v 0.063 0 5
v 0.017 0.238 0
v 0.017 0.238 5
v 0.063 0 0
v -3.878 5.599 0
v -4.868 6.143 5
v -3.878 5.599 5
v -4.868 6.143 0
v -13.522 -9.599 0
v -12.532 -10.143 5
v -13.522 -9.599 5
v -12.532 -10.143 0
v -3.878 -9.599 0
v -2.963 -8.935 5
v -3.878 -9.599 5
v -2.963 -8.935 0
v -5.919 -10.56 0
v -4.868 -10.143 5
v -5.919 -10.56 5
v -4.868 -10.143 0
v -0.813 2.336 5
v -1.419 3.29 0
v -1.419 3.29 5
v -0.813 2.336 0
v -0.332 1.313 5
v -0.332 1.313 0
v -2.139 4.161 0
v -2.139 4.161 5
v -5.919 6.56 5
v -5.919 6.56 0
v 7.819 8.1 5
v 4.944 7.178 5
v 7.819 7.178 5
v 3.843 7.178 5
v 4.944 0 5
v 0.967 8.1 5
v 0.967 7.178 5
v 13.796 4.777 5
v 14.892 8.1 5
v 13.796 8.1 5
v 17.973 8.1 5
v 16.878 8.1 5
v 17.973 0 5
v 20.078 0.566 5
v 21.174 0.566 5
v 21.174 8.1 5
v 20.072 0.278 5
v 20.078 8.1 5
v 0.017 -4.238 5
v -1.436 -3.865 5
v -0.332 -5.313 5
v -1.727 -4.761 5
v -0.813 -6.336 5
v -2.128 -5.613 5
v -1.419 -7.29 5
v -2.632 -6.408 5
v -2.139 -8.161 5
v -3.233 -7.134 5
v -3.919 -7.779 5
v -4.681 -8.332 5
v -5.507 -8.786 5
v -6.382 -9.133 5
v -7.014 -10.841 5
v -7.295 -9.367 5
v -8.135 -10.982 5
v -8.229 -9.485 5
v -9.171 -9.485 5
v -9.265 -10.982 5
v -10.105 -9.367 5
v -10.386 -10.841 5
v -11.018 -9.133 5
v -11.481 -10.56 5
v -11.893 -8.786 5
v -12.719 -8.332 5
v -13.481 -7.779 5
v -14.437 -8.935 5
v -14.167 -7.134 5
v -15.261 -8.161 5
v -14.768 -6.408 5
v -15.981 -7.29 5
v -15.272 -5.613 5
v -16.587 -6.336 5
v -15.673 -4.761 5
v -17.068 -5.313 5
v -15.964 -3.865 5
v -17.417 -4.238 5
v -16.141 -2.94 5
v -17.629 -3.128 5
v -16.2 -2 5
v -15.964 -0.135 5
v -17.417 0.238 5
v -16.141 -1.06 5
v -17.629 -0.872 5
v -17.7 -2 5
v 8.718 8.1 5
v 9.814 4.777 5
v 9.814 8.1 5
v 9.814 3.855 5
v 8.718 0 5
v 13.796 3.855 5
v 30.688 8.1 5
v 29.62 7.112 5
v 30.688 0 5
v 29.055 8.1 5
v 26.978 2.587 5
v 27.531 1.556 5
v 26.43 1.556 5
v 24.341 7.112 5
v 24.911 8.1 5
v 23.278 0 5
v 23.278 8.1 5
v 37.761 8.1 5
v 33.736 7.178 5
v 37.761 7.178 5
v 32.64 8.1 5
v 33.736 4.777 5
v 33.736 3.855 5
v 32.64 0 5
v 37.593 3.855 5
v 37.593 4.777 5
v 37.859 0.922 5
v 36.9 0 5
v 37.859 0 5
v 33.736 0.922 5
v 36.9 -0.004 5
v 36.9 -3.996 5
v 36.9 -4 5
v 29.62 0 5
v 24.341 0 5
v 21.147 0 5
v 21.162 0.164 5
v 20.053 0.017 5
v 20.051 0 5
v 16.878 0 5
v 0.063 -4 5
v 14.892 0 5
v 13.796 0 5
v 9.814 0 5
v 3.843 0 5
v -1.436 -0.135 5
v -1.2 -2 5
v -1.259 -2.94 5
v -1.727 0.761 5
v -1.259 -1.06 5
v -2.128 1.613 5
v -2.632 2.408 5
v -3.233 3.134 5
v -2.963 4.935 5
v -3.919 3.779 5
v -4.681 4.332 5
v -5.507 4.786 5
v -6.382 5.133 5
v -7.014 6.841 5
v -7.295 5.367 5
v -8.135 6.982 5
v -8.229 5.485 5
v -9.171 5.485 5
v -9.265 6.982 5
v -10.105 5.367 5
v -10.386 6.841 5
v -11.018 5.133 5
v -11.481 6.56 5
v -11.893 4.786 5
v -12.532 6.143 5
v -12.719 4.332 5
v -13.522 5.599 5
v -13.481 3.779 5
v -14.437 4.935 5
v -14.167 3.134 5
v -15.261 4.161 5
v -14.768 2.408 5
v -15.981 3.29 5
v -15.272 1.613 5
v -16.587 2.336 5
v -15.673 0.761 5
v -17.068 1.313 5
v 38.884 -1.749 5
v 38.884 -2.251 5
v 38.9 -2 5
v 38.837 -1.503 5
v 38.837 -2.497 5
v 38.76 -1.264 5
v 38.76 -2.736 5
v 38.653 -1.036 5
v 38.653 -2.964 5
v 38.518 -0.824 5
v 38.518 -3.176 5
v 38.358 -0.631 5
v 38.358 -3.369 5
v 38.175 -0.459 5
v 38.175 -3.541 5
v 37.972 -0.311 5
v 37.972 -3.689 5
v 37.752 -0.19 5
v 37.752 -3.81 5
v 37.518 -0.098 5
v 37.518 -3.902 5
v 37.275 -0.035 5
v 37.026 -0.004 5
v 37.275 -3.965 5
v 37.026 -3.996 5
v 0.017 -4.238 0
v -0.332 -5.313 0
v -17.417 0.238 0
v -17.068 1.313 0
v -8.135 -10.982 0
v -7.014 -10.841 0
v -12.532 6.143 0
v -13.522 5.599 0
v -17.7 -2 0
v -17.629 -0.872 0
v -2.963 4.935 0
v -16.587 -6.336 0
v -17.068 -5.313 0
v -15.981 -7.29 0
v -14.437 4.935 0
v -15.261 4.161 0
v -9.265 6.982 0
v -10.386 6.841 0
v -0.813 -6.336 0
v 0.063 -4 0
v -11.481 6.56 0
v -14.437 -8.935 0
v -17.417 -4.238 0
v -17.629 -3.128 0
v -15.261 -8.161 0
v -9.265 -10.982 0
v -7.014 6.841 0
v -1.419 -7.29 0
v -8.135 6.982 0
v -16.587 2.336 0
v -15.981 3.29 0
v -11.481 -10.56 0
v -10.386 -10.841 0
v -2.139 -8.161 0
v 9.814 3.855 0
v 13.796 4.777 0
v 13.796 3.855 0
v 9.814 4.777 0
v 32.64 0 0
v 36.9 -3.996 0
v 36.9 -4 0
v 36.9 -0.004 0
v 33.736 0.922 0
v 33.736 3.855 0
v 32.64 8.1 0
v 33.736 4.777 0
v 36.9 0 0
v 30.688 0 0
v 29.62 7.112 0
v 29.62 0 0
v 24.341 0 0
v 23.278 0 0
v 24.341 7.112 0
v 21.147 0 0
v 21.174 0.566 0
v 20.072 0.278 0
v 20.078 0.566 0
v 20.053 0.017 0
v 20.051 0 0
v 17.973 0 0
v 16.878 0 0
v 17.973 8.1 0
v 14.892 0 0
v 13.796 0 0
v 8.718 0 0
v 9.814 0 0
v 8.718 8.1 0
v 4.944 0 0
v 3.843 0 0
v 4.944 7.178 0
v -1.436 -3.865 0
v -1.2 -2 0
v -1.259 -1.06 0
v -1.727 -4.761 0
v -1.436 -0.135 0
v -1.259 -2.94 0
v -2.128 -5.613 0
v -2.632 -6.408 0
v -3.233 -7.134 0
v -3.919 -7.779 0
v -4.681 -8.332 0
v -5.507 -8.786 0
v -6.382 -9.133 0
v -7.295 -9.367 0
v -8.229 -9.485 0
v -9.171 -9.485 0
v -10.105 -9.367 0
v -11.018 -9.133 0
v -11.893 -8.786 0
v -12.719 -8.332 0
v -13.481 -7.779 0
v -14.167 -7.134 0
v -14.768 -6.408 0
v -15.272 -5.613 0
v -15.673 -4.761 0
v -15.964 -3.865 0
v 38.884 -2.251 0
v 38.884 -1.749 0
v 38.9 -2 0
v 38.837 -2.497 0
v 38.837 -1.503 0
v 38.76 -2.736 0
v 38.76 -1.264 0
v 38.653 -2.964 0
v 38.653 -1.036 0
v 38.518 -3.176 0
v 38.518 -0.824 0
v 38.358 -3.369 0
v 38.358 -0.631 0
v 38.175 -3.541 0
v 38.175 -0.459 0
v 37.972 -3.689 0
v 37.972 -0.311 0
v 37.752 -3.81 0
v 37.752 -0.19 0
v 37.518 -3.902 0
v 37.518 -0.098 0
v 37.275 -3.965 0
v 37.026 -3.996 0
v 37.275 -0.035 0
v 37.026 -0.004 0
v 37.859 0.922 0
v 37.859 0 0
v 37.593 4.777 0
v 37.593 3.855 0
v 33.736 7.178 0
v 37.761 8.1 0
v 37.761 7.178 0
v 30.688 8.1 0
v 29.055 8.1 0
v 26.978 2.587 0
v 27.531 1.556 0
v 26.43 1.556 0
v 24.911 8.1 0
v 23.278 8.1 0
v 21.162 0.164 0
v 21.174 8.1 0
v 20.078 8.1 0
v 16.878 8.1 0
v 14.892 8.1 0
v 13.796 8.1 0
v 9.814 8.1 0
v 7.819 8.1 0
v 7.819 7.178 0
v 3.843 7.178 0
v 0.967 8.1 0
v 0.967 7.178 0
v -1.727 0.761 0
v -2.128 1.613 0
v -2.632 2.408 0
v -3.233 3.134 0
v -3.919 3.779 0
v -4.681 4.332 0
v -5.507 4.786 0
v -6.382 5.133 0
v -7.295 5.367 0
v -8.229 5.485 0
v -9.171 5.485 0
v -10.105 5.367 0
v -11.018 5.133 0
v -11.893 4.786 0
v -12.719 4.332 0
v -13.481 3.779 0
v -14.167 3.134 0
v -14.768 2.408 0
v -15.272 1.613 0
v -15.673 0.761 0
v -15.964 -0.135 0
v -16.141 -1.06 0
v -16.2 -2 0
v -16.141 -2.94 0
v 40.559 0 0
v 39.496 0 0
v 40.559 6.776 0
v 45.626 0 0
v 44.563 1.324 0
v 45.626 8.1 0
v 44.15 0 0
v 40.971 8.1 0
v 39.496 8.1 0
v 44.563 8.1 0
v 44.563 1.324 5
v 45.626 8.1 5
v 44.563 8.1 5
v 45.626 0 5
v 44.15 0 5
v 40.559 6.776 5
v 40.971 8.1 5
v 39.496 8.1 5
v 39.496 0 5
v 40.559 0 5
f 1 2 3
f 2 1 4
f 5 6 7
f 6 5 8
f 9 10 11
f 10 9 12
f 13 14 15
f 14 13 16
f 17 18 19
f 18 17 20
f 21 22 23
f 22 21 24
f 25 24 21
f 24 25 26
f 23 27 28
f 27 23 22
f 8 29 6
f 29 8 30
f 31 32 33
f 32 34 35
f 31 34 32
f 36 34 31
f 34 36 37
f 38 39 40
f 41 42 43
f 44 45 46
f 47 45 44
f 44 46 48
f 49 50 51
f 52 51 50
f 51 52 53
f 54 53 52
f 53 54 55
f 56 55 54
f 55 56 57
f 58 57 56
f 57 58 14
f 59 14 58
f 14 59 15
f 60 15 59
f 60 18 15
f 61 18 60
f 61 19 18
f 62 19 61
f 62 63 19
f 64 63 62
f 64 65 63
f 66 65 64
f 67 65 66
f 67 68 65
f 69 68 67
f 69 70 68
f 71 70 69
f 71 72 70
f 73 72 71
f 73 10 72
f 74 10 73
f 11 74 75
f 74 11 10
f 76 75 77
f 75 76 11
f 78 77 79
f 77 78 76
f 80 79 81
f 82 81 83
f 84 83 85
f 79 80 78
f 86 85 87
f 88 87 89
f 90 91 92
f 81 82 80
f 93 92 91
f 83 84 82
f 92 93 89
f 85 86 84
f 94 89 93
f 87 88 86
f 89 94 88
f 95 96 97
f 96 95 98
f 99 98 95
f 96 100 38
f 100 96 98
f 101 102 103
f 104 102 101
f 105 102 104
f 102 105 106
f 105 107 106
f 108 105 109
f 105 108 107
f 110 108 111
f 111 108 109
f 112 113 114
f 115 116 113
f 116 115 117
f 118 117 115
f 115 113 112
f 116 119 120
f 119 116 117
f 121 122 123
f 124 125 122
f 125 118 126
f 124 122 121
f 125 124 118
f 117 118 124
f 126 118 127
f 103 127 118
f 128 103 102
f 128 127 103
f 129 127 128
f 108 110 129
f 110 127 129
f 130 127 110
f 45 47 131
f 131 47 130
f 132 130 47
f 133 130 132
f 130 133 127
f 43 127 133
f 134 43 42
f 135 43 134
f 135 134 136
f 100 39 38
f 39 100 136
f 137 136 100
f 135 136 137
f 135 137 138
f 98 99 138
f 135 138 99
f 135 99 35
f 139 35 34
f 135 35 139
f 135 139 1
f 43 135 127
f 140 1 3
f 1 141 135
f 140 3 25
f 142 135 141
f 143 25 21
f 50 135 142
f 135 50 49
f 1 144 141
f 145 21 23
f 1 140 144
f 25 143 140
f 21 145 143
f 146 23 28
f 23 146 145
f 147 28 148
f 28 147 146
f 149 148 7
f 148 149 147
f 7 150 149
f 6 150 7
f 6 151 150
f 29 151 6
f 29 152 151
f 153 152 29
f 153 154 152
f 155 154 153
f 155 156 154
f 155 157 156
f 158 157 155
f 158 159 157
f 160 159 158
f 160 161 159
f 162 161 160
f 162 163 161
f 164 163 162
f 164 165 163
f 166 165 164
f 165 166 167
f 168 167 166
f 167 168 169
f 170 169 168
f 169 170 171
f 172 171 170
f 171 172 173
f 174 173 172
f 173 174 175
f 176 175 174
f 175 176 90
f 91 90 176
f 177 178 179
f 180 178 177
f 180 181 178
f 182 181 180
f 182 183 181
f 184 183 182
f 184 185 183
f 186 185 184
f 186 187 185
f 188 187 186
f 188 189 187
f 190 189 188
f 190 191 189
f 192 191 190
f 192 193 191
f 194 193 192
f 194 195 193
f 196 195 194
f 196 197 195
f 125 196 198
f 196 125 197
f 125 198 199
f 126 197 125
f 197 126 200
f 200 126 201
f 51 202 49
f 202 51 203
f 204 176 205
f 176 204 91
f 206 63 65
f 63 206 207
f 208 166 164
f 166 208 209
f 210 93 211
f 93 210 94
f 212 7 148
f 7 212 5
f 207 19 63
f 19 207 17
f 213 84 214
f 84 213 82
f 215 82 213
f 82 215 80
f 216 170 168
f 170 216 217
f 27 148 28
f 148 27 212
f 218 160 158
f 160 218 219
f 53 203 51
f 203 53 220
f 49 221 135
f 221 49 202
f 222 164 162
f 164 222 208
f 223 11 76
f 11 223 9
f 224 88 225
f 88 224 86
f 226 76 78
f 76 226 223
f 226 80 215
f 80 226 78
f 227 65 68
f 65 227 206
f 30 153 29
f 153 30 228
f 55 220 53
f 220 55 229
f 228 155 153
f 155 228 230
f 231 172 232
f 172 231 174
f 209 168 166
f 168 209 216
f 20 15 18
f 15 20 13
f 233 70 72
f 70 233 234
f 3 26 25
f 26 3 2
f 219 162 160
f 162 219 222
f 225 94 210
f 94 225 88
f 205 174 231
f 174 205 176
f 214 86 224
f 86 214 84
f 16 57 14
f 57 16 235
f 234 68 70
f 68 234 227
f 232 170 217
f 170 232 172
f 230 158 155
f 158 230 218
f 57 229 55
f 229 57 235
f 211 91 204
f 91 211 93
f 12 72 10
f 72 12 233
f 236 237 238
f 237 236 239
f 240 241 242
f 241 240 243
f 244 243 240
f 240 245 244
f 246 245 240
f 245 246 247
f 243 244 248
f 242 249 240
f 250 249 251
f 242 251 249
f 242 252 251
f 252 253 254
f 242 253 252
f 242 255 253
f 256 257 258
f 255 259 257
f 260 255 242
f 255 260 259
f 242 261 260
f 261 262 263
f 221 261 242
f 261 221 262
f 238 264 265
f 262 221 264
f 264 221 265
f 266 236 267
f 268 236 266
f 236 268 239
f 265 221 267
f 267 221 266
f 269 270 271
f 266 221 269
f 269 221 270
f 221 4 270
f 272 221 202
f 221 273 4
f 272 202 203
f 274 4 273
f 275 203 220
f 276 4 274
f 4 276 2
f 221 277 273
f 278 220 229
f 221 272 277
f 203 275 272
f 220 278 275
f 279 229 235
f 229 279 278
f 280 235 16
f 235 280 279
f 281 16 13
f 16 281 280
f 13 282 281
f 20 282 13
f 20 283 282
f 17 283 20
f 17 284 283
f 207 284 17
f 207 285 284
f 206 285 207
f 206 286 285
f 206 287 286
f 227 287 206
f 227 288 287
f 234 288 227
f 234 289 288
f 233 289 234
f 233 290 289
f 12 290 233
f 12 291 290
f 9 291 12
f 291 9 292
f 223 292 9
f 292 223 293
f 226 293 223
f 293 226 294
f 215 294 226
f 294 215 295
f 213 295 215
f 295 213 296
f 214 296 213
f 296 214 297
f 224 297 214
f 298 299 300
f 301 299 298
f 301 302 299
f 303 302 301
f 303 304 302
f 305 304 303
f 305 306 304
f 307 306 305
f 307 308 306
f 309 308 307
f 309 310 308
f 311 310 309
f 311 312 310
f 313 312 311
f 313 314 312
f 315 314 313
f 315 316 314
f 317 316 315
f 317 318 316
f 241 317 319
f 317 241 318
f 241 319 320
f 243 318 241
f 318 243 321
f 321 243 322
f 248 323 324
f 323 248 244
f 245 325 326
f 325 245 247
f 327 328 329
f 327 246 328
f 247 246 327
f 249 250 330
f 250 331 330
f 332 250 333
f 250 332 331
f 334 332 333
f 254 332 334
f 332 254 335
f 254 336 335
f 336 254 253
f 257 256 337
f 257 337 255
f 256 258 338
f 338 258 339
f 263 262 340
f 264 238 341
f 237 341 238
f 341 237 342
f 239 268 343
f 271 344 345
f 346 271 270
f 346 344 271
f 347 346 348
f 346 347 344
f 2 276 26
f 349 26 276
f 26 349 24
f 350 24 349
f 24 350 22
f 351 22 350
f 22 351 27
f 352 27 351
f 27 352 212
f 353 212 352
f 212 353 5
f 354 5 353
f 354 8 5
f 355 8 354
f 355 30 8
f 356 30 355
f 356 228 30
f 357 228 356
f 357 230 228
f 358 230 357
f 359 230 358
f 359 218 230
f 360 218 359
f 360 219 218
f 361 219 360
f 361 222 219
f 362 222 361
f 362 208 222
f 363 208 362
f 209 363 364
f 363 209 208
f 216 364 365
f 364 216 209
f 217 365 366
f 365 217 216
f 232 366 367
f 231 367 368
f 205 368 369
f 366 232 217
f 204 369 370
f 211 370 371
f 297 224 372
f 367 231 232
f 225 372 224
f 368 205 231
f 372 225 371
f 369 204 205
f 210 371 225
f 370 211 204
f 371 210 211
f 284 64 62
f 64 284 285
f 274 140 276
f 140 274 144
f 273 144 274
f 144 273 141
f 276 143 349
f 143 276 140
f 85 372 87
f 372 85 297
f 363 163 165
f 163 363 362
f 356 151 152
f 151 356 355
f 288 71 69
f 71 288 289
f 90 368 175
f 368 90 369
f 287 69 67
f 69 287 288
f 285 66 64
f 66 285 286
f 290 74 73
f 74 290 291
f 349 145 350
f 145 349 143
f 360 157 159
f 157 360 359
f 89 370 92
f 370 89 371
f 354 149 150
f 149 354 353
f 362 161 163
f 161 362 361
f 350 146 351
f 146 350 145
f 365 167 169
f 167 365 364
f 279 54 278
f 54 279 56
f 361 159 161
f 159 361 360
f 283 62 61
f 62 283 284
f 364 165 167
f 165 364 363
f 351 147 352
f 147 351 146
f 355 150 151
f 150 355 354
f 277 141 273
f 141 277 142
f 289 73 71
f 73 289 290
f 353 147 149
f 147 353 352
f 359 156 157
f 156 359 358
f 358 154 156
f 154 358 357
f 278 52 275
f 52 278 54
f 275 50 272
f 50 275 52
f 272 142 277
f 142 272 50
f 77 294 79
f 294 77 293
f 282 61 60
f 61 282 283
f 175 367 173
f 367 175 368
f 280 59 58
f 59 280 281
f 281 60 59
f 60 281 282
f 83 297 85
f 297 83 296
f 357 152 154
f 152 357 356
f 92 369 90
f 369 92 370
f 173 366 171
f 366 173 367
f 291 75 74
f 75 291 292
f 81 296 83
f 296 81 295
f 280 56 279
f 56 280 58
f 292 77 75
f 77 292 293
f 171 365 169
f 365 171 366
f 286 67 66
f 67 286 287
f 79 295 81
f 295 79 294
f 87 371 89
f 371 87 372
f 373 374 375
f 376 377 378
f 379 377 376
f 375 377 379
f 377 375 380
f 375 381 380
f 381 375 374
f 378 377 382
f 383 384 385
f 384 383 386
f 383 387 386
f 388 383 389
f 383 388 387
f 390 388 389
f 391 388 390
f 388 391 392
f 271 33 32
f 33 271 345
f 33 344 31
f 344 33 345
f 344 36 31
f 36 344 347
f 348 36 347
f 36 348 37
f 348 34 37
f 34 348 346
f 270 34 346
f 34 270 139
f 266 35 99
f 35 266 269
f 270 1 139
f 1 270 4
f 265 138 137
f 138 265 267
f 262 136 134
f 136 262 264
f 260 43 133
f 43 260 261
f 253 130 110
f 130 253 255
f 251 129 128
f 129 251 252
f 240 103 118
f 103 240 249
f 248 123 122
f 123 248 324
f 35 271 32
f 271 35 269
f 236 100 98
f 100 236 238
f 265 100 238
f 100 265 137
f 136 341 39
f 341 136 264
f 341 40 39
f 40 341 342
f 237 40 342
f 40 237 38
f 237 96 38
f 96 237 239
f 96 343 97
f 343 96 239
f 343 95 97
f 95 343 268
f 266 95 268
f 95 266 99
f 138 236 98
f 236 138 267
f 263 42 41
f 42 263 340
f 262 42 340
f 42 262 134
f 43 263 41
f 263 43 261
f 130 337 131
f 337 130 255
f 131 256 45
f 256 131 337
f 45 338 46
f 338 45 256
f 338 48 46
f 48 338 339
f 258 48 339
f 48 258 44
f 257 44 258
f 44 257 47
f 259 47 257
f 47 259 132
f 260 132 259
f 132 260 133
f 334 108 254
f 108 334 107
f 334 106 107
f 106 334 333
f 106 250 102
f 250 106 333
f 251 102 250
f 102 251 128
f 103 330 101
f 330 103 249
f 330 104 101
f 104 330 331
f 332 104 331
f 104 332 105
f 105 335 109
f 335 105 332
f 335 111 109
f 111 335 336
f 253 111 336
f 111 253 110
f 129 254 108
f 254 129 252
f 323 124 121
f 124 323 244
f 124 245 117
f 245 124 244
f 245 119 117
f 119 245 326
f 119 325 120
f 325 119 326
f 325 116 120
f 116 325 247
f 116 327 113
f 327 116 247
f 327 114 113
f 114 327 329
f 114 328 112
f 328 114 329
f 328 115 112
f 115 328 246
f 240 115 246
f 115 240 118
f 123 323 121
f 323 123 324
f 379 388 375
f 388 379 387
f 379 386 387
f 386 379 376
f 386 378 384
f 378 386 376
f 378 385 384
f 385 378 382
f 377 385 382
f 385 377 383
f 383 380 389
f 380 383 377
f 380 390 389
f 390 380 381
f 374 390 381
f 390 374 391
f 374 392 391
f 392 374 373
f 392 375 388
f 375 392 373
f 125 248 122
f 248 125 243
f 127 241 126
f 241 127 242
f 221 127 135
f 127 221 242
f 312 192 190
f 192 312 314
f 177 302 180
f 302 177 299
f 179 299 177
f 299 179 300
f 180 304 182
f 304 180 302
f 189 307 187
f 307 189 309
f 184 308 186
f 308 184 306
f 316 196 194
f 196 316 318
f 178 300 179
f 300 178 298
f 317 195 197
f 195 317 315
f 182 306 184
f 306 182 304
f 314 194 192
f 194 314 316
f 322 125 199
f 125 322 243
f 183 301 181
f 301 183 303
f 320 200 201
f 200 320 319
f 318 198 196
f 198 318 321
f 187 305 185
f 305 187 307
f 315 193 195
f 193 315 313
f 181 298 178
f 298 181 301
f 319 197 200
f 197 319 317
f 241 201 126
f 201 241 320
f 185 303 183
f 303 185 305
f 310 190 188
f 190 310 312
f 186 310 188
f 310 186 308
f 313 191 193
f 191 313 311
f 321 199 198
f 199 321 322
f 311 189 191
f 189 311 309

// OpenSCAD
/* [General Settings] */
quality = 50;//[1:300]

/* [Text Settings] */
textInput = "THIJMEN";
textSize = 8;//[1:0.1:30]
textDistance = 0;//[-10:0.1:10]
textSpacing = 1;//[0:0.05:10]
textDistanceFromRing = 1;//[0:10]
textHeight = 5;//[1:0.1:30]
textHeightPosition = 5;//[1:0.1:10]
textFont = "Anton";//[anton,open sans,lora,noto sans,arimo,roboto,inconsolata,Encode Sans Semi Condensed,Baloo Tammudu,] 

/* [Text-bar Settings] */
barThickness = 4;//[1:0.1:20]
barLength = 37;//[1:0.5:100]
height = 5;//[1:0.1:30]

/* [Keyring Settings] */
keyringDiameter = 15;//[1:0.1:50]
keyringThickness = 3;//[1:0.1:10]
keyringHeight = 5;//[1:0.1:30]
keyringPosition = 5;//[1:0.1:10]
roundedEdgeAtRing = "no";//[no,yes]


//======================================
//      Source by Thijmen Schouten
//======================================


//text
translate([textDistanceFromRing,textDistance,height/10*textHeightPosition])//translate text
{
    linear_extrude(height=textHeight,center=true)   
    {
        text(textInput,textSize,textFont,spacing=textSpacing,$fn=quality);
    }
}



//underbar
translate([-0.1,-barThickness,0])//translate underbar
{
    cube([barLength,barThickness,height]);
}
translate([barLength-0.1,-barThickness/2,0])
{
        cylinder(height,d=barThickness,$fn=quality);
}



//Keyring
translate([-keyringDiameter/2-keyringThickness/2+0.3,-barThickness/2,height/10*keyringPosition])
{  
difference()
    {
        cylinder(keyringHeight,d=keyringDiameter+keyringThickness,$fn=quality,center=true);
        translate([0,0,0])
        {
        cylinder(keyringHeight+1,d=keyringDiameter,$fn=quality,center=true);
        }
    }
}

if(roundedEdgeAtRing=="yes")
{
    translate([0,-barThickness/2,0])cylinder(height,d=barThickness,$fn=quality);
}
